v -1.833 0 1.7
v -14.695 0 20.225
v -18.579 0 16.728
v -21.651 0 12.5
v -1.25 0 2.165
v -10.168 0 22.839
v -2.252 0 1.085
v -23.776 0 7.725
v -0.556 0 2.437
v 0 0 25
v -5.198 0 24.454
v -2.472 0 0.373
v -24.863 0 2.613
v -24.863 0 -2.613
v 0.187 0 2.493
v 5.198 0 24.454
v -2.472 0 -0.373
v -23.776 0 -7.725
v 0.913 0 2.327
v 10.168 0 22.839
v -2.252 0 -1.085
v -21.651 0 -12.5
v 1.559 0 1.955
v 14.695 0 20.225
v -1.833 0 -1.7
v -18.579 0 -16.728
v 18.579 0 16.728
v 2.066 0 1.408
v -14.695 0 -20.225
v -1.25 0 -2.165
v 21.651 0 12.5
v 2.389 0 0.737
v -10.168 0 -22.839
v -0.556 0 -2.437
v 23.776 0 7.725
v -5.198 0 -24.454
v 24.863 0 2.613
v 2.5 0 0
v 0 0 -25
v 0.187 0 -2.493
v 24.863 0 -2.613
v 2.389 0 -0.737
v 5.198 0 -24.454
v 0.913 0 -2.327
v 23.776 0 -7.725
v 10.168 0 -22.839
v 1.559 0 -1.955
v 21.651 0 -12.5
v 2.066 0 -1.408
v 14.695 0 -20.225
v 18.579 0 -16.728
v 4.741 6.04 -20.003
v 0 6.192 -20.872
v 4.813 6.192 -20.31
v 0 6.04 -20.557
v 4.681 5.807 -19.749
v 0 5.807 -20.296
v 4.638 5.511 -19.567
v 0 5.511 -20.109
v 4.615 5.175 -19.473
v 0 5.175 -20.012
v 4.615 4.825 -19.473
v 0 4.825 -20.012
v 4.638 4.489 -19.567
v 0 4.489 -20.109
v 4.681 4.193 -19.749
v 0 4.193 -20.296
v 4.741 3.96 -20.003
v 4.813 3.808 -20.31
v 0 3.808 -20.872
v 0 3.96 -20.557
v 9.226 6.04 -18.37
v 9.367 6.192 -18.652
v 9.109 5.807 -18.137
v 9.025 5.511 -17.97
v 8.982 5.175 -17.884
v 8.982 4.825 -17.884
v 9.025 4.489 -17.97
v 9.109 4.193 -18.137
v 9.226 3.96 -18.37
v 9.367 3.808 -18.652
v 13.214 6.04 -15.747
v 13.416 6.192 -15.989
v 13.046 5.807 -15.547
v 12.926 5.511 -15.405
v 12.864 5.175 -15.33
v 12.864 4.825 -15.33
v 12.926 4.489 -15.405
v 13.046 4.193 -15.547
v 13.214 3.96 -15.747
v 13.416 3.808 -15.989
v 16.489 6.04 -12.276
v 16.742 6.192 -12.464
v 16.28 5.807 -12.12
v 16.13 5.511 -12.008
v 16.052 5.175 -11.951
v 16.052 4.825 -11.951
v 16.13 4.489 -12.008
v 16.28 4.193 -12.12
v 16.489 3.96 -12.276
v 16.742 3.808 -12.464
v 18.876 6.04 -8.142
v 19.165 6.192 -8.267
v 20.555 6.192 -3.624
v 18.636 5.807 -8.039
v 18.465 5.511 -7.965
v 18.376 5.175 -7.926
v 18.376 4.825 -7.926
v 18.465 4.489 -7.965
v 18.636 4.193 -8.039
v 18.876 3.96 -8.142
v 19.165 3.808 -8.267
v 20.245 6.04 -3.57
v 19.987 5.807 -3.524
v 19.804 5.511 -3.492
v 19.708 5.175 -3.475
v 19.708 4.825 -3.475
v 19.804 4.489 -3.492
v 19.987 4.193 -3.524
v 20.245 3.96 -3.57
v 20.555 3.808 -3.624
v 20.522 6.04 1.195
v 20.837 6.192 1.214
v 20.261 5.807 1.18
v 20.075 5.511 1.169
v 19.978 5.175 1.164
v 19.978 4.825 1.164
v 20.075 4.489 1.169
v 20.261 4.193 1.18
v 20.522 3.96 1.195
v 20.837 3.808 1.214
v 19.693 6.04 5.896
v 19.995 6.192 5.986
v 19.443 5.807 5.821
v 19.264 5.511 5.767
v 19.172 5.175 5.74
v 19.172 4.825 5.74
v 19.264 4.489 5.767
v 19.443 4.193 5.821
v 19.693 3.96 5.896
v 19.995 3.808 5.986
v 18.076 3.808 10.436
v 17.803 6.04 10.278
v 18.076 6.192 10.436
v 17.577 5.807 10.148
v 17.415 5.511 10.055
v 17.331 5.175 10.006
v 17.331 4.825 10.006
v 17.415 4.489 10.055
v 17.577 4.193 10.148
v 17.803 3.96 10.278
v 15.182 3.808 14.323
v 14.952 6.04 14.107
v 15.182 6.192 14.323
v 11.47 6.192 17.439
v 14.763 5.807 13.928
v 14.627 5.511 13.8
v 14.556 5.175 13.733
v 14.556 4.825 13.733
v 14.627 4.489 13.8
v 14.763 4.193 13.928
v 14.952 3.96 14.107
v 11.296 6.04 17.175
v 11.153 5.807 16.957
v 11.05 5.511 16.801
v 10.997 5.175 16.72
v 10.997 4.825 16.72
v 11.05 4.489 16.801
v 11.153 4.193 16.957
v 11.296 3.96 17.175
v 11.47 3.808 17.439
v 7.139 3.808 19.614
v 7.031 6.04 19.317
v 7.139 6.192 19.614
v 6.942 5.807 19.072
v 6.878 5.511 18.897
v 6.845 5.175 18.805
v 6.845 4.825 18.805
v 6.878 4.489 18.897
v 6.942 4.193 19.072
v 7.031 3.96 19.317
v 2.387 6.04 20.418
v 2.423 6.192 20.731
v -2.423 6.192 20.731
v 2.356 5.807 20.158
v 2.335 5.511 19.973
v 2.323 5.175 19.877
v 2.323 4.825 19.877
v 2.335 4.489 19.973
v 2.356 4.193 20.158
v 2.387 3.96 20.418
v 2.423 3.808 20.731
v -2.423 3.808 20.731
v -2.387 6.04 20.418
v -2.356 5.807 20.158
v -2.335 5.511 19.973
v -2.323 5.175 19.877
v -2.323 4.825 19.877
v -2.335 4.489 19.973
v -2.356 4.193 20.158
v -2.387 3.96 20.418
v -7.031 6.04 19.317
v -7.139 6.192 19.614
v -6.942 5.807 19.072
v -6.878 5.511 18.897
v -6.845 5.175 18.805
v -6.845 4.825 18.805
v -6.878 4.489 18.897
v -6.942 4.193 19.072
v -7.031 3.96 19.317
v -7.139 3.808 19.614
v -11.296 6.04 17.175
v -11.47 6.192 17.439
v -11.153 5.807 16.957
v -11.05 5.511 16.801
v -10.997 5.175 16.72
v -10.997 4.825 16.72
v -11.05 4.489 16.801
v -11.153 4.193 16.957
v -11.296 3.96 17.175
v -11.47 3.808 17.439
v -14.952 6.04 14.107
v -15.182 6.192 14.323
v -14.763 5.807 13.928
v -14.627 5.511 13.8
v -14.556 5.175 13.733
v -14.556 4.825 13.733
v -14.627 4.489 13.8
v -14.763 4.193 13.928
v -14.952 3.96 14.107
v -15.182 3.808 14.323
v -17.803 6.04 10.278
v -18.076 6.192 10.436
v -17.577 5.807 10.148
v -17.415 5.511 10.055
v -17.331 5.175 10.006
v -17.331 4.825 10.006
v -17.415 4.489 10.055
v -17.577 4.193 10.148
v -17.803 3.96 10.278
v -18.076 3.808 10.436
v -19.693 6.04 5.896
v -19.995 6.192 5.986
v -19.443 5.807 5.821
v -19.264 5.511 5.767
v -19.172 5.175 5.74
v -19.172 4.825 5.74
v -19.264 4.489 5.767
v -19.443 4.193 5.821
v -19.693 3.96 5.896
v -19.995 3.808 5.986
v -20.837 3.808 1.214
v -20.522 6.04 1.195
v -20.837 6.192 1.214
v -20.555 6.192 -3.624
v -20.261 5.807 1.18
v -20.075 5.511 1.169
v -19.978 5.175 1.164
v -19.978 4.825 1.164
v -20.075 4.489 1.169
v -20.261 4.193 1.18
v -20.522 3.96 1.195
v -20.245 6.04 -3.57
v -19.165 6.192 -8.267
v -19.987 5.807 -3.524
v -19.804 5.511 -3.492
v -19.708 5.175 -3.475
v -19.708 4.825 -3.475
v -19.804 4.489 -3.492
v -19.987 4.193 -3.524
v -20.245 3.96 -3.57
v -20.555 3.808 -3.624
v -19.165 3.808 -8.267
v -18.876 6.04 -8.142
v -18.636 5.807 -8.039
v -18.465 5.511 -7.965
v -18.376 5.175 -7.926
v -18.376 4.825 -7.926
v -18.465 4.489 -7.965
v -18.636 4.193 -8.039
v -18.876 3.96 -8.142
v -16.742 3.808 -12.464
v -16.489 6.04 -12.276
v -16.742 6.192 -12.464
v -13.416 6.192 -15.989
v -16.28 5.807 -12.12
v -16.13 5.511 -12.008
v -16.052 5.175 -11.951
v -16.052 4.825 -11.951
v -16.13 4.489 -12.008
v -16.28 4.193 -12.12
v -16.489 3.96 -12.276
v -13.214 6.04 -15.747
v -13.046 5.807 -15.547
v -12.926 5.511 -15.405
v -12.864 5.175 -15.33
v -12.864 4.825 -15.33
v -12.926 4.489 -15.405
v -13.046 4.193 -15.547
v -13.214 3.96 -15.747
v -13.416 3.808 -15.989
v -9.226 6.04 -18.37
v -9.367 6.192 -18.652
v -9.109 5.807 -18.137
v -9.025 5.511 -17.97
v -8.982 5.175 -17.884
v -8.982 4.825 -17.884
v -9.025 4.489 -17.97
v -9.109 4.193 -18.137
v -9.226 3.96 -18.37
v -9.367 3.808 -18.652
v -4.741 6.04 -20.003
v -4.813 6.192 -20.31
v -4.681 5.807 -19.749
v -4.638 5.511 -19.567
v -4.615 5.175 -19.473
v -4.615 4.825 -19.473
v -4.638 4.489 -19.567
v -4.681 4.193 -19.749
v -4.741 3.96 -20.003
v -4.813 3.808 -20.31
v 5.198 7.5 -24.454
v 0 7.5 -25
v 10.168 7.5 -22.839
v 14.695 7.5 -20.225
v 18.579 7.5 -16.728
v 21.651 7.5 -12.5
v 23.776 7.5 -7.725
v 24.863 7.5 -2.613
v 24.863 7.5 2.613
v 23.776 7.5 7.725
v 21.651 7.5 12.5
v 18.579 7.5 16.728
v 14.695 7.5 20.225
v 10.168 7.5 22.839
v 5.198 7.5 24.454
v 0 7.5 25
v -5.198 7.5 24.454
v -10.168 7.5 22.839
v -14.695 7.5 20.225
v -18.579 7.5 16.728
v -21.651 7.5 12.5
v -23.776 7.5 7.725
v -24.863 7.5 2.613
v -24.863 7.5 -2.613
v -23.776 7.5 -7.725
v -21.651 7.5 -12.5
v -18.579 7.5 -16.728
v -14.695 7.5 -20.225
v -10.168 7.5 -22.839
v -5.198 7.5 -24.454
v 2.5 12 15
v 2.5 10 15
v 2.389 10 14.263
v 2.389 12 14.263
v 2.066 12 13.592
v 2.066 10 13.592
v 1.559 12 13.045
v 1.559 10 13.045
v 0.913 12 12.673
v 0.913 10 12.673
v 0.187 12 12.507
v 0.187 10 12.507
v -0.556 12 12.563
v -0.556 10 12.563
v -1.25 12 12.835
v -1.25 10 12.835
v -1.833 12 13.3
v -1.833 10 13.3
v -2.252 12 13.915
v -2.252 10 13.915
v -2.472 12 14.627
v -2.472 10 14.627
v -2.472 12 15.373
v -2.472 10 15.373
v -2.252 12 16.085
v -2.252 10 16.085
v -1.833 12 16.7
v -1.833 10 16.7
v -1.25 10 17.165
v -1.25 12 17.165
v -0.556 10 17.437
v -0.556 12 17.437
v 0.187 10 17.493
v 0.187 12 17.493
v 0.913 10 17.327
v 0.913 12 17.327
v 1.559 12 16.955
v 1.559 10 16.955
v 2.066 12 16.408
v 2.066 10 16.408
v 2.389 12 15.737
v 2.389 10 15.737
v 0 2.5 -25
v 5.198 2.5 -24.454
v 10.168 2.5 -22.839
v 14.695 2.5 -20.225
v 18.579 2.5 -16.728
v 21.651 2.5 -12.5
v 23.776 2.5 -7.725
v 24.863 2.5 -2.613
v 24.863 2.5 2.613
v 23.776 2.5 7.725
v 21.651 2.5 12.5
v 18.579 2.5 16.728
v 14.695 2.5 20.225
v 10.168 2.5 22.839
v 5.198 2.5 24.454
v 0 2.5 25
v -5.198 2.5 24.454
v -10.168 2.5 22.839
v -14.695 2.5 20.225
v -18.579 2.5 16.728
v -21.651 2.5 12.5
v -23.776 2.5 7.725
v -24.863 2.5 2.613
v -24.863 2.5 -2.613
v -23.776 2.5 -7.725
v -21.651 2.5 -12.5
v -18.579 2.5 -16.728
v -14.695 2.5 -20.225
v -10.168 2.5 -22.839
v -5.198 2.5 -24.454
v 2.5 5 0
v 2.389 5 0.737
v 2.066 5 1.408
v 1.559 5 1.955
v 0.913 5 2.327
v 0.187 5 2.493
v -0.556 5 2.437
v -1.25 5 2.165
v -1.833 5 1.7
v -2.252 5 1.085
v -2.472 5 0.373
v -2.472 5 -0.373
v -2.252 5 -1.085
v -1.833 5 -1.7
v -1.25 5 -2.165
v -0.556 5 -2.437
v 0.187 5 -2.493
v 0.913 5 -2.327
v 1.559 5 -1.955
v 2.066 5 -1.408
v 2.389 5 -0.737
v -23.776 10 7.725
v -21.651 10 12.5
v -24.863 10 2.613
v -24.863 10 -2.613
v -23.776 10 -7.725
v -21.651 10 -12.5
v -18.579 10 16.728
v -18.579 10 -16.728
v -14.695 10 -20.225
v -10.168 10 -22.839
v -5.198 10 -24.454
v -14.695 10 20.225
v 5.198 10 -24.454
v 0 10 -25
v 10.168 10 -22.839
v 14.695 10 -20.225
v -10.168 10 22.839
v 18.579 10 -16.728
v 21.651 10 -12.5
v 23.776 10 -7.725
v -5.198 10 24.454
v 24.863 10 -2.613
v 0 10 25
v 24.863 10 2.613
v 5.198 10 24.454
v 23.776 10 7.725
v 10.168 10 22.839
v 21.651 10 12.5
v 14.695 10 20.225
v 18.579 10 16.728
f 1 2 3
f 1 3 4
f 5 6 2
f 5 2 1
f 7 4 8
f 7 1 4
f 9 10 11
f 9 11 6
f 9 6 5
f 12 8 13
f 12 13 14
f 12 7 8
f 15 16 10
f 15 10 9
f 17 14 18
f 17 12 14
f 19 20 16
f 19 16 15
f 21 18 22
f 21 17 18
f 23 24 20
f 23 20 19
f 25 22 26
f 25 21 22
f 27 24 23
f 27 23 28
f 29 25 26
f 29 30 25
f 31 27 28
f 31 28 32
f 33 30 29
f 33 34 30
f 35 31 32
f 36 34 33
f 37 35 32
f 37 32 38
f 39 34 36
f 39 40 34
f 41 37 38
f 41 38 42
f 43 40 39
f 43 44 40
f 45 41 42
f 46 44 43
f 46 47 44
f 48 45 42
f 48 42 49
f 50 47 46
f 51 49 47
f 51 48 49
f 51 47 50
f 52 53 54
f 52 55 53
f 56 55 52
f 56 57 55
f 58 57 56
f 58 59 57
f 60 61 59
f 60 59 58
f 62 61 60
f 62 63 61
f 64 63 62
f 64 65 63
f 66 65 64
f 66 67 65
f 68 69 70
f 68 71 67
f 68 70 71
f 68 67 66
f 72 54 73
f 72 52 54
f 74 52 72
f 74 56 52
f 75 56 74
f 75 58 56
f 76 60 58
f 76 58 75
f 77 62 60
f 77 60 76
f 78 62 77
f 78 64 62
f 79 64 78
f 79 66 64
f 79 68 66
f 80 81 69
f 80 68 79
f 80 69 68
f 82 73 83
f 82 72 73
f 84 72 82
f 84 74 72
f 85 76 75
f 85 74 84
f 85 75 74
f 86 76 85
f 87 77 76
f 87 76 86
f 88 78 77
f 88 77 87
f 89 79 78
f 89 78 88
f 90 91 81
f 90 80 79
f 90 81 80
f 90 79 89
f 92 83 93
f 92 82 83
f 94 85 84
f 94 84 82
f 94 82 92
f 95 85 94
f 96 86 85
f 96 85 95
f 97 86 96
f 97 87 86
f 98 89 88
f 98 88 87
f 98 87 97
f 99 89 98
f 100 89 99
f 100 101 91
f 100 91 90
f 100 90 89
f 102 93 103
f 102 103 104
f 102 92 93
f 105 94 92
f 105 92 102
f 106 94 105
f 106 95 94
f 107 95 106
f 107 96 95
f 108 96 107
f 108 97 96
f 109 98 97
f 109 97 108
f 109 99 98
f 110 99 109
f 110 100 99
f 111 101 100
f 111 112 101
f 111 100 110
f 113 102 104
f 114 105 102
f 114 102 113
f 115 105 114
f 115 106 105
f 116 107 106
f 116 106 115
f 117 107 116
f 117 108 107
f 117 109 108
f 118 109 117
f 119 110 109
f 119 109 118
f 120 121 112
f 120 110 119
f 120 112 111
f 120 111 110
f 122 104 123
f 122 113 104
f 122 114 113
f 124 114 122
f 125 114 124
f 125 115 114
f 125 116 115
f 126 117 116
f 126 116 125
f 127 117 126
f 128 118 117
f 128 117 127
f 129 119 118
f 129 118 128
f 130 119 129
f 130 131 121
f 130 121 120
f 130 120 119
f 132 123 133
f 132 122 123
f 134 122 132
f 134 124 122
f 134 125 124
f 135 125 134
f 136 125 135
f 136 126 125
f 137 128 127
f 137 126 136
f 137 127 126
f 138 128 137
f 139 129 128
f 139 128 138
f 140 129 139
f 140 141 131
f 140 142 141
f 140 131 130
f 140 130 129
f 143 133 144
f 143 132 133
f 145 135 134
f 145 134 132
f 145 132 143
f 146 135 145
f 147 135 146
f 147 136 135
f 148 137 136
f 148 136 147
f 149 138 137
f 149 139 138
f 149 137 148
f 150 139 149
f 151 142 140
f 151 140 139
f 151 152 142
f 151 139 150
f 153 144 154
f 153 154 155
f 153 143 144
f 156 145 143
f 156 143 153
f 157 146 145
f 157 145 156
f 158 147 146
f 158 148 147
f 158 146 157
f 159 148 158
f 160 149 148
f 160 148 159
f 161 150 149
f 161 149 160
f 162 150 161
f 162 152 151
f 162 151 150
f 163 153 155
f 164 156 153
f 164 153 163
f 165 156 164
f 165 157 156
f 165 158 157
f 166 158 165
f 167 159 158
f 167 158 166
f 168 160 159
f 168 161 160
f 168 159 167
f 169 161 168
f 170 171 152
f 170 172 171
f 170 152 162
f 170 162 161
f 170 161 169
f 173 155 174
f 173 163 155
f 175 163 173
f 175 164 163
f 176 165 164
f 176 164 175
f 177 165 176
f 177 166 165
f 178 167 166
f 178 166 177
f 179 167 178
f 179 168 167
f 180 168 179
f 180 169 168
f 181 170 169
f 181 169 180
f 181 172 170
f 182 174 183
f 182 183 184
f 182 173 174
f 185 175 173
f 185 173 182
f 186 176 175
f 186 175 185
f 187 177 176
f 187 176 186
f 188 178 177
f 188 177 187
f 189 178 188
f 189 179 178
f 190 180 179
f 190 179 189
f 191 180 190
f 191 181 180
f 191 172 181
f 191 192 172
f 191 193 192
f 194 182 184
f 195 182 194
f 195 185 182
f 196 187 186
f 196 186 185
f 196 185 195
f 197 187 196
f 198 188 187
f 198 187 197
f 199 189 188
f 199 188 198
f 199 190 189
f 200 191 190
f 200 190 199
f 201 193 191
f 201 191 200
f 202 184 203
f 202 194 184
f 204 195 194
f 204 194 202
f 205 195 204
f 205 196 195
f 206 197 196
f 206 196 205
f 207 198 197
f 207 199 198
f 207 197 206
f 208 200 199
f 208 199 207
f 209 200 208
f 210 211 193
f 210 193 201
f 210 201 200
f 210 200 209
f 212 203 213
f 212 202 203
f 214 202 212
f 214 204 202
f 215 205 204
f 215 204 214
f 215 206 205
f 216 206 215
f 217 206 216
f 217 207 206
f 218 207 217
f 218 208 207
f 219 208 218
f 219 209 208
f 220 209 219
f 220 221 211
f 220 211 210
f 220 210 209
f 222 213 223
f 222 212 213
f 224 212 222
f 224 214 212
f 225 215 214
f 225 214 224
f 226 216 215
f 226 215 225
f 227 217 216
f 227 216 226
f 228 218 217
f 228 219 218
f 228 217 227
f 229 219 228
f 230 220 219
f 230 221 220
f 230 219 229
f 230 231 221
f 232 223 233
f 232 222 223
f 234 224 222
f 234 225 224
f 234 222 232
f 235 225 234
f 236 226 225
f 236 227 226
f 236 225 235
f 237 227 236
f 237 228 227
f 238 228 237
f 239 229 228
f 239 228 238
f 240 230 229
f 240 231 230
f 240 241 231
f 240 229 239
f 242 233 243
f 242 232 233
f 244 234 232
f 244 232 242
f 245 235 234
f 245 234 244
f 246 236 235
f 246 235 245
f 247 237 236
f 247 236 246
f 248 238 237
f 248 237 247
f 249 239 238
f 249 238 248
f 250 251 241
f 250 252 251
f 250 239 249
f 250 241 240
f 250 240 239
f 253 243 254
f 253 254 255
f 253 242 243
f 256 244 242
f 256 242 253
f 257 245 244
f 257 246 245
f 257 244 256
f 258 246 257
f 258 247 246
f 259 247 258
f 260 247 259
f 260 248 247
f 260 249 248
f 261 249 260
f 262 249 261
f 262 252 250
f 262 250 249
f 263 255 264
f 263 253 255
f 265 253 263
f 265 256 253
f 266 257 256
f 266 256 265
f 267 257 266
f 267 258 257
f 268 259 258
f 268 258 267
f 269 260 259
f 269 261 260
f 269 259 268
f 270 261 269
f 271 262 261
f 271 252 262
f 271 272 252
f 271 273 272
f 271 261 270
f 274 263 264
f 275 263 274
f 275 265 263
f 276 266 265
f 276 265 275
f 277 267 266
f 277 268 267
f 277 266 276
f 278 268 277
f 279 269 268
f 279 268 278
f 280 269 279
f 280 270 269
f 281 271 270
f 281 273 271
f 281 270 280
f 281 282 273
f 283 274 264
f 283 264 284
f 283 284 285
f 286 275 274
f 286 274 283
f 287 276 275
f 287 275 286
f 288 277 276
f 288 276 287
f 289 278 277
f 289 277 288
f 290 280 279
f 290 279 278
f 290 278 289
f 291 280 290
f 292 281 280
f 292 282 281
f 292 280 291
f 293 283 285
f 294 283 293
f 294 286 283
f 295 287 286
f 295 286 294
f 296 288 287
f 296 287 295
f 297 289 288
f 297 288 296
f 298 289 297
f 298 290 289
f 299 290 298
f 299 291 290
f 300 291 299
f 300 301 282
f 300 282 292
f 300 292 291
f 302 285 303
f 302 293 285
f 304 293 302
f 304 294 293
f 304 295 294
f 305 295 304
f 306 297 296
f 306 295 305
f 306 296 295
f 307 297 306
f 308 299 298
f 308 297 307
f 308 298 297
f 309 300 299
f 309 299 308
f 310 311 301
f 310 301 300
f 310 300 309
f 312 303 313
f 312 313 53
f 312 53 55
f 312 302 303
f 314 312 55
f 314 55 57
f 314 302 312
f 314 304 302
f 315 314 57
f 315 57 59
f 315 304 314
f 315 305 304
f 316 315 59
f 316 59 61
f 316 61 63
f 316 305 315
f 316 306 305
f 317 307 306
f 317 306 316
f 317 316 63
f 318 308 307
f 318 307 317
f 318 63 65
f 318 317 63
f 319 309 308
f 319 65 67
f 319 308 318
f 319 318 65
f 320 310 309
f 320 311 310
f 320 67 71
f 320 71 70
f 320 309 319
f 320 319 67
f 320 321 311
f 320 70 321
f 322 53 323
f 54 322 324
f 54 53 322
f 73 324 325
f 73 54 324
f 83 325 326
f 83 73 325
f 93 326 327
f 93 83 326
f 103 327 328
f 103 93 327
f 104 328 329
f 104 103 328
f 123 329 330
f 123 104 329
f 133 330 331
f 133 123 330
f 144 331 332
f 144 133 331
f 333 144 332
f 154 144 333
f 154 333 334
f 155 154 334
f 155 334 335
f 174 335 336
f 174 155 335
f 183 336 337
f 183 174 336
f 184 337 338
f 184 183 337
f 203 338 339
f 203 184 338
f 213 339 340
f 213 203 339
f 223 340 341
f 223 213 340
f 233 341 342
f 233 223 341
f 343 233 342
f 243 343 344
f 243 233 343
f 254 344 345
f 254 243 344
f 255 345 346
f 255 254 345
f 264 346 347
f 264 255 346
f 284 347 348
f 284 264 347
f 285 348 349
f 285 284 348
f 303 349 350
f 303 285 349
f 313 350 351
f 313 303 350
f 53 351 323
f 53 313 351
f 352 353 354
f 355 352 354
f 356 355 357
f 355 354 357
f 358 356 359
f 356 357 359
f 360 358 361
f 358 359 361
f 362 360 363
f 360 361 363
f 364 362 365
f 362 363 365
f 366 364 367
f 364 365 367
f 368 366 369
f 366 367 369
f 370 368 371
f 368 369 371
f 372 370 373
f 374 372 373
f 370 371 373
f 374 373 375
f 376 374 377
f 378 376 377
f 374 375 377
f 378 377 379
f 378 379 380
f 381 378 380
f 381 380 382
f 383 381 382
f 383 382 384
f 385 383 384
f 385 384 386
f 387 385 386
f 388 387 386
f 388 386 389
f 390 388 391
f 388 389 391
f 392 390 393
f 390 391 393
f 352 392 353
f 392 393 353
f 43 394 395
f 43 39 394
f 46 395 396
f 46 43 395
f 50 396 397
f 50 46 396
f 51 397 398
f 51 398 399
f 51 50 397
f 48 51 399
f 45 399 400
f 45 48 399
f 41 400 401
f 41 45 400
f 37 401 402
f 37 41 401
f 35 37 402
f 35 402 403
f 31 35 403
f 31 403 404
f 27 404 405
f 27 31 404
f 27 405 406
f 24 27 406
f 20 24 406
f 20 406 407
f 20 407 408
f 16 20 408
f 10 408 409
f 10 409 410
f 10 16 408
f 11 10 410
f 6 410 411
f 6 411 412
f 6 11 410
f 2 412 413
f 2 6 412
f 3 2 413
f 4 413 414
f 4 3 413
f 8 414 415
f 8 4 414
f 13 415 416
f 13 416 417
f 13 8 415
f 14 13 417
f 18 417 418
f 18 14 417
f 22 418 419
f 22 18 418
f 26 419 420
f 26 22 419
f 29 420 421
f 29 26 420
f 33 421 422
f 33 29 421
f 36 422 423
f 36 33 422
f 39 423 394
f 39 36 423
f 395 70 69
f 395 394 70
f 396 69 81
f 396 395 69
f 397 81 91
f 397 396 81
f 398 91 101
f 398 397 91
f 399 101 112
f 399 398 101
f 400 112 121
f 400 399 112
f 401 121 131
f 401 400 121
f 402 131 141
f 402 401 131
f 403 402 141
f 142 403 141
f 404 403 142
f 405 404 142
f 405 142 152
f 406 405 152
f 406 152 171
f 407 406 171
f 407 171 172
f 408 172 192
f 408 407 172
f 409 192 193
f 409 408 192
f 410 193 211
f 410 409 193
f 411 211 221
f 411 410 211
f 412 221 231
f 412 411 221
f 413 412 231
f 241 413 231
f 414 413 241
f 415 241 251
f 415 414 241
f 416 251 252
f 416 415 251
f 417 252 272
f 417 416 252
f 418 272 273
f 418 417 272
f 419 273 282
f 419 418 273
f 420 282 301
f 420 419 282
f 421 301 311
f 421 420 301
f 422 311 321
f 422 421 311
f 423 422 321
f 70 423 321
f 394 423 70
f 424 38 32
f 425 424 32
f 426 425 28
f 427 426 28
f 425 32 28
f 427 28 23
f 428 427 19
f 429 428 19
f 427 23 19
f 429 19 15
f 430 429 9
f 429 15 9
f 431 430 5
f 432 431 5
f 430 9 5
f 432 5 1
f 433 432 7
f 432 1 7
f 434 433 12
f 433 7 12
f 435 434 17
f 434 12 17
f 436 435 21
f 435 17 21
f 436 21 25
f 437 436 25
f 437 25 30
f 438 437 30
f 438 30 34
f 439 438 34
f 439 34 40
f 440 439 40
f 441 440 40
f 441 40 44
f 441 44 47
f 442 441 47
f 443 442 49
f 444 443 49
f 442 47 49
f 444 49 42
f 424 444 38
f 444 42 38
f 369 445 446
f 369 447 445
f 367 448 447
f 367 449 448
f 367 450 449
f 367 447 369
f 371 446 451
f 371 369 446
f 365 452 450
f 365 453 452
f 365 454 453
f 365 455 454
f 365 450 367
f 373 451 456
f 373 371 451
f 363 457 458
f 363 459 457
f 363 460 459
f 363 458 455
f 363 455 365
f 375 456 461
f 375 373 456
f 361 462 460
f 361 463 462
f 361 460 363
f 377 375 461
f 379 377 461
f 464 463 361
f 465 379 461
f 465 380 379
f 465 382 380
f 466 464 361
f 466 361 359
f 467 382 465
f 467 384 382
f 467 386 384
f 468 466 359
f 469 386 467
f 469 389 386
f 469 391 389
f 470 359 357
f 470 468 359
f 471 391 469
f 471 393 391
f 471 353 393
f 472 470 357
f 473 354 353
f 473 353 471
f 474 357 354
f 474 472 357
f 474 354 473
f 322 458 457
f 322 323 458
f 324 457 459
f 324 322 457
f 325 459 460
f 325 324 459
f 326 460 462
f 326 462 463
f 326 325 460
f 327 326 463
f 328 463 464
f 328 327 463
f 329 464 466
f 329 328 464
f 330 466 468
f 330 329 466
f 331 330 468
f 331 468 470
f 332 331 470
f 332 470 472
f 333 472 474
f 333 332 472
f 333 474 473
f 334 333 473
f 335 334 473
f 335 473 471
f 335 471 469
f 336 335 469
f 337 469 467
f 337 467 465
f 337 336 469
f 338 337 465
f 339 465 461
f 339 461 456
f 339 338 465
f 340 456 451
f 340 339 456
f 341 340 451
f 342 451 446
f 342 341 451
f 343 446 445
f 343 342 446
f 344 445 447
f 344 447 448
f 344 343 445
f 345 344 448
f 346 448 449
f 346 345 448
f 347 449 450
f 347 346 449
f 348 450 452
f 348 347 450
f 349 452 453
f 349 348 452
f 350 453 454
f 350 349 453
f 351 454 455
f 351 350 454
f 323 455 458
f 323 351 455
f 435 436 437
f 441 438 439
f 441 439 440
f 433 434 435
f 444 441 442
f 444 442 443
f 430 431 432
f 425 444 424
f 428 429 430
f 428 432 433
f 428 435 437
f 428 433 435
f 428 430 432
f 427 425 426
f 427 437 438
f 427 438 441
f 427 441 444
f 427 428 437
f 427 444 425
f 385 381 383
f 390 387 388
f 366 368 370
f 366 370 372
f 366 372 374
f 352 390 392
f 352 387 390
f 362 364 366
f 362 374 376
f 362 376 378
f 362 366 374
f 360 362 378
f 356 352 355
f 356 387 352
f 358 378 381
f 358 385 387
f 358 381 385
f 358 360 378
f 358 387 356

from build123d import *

# Parameters (mm, degrees)
SKETCH1_R           = 20
BOSS_EXTRUDE1_DEPTH = 10
SKETCH3_R           = 2.5
CUT_EXTRUDE1_DEPTH  = 5
SKETCH4_R           = 2.5
BOSS_EXTRUDE2_DEPTH = 2


with BuildPart() as part:
    # Sketch1 → Boss-Extrude1 (new body)
    with BuildSketch(Plane(origin=(0, 0, 0), x_dir=(1, 0, 0), z_dir=(0, 1, 0))):
        Circle(SKETCH1_R)
    extrude(amount=BOSS_EXTRUDE1_DEPTH)

    # Sketch2 → Revolve1 (revolve)
    with BuildSketch(Plane(origin=(0, 0, 0), x_dir=(0, 0, -1), z_dir=(1, 0, 0))):
        with BuildLine():
            Line((20, 10), (25, 10))
            Line((25, 10), (25, 7.5))
            Line((25, 7.5), (20.872288151, 6.191567774))
            ThreePointArc((20.872288151, 6.191567774), (20, 5), (20.872288151, 3.808432226))
            Line((20.872288151, 3.808432226), (25, 2.5))
            Line((25, 2.5), (25, 0))
            Line((25, 0), (20, 0))
            Line((20, 0), (19.25, 0))
            Line((19.25, 0), (19.25, 10))
            Line((19.25, 10), (20, 10))
        make_face()
    revolve(axis=Axis((0, 10, 0), (0, -1, 0)))

    # Sketch3 → Cut-Extrude1 (cut)
    with BuildSketch(Plane.XZ):
        Circle(SKETCH3_R)
    extrude(amount=-CUT_EXTRUDE1_DEPTH, mode=Mode.SUBTRACT)

    # Sketch4 → Boss-Extrude2 (add)
    with BuildSketch(Plane(origin=(0, 10, 0), x_dir=(1, 0, 0), z_dir=(0, 1, 0))):
        with Locations((0, -15)):
            Circle(SKETCH4_R)
    extrude(amount=BOSS_EXTRUDE2_DEPTH)


solid = part.part
